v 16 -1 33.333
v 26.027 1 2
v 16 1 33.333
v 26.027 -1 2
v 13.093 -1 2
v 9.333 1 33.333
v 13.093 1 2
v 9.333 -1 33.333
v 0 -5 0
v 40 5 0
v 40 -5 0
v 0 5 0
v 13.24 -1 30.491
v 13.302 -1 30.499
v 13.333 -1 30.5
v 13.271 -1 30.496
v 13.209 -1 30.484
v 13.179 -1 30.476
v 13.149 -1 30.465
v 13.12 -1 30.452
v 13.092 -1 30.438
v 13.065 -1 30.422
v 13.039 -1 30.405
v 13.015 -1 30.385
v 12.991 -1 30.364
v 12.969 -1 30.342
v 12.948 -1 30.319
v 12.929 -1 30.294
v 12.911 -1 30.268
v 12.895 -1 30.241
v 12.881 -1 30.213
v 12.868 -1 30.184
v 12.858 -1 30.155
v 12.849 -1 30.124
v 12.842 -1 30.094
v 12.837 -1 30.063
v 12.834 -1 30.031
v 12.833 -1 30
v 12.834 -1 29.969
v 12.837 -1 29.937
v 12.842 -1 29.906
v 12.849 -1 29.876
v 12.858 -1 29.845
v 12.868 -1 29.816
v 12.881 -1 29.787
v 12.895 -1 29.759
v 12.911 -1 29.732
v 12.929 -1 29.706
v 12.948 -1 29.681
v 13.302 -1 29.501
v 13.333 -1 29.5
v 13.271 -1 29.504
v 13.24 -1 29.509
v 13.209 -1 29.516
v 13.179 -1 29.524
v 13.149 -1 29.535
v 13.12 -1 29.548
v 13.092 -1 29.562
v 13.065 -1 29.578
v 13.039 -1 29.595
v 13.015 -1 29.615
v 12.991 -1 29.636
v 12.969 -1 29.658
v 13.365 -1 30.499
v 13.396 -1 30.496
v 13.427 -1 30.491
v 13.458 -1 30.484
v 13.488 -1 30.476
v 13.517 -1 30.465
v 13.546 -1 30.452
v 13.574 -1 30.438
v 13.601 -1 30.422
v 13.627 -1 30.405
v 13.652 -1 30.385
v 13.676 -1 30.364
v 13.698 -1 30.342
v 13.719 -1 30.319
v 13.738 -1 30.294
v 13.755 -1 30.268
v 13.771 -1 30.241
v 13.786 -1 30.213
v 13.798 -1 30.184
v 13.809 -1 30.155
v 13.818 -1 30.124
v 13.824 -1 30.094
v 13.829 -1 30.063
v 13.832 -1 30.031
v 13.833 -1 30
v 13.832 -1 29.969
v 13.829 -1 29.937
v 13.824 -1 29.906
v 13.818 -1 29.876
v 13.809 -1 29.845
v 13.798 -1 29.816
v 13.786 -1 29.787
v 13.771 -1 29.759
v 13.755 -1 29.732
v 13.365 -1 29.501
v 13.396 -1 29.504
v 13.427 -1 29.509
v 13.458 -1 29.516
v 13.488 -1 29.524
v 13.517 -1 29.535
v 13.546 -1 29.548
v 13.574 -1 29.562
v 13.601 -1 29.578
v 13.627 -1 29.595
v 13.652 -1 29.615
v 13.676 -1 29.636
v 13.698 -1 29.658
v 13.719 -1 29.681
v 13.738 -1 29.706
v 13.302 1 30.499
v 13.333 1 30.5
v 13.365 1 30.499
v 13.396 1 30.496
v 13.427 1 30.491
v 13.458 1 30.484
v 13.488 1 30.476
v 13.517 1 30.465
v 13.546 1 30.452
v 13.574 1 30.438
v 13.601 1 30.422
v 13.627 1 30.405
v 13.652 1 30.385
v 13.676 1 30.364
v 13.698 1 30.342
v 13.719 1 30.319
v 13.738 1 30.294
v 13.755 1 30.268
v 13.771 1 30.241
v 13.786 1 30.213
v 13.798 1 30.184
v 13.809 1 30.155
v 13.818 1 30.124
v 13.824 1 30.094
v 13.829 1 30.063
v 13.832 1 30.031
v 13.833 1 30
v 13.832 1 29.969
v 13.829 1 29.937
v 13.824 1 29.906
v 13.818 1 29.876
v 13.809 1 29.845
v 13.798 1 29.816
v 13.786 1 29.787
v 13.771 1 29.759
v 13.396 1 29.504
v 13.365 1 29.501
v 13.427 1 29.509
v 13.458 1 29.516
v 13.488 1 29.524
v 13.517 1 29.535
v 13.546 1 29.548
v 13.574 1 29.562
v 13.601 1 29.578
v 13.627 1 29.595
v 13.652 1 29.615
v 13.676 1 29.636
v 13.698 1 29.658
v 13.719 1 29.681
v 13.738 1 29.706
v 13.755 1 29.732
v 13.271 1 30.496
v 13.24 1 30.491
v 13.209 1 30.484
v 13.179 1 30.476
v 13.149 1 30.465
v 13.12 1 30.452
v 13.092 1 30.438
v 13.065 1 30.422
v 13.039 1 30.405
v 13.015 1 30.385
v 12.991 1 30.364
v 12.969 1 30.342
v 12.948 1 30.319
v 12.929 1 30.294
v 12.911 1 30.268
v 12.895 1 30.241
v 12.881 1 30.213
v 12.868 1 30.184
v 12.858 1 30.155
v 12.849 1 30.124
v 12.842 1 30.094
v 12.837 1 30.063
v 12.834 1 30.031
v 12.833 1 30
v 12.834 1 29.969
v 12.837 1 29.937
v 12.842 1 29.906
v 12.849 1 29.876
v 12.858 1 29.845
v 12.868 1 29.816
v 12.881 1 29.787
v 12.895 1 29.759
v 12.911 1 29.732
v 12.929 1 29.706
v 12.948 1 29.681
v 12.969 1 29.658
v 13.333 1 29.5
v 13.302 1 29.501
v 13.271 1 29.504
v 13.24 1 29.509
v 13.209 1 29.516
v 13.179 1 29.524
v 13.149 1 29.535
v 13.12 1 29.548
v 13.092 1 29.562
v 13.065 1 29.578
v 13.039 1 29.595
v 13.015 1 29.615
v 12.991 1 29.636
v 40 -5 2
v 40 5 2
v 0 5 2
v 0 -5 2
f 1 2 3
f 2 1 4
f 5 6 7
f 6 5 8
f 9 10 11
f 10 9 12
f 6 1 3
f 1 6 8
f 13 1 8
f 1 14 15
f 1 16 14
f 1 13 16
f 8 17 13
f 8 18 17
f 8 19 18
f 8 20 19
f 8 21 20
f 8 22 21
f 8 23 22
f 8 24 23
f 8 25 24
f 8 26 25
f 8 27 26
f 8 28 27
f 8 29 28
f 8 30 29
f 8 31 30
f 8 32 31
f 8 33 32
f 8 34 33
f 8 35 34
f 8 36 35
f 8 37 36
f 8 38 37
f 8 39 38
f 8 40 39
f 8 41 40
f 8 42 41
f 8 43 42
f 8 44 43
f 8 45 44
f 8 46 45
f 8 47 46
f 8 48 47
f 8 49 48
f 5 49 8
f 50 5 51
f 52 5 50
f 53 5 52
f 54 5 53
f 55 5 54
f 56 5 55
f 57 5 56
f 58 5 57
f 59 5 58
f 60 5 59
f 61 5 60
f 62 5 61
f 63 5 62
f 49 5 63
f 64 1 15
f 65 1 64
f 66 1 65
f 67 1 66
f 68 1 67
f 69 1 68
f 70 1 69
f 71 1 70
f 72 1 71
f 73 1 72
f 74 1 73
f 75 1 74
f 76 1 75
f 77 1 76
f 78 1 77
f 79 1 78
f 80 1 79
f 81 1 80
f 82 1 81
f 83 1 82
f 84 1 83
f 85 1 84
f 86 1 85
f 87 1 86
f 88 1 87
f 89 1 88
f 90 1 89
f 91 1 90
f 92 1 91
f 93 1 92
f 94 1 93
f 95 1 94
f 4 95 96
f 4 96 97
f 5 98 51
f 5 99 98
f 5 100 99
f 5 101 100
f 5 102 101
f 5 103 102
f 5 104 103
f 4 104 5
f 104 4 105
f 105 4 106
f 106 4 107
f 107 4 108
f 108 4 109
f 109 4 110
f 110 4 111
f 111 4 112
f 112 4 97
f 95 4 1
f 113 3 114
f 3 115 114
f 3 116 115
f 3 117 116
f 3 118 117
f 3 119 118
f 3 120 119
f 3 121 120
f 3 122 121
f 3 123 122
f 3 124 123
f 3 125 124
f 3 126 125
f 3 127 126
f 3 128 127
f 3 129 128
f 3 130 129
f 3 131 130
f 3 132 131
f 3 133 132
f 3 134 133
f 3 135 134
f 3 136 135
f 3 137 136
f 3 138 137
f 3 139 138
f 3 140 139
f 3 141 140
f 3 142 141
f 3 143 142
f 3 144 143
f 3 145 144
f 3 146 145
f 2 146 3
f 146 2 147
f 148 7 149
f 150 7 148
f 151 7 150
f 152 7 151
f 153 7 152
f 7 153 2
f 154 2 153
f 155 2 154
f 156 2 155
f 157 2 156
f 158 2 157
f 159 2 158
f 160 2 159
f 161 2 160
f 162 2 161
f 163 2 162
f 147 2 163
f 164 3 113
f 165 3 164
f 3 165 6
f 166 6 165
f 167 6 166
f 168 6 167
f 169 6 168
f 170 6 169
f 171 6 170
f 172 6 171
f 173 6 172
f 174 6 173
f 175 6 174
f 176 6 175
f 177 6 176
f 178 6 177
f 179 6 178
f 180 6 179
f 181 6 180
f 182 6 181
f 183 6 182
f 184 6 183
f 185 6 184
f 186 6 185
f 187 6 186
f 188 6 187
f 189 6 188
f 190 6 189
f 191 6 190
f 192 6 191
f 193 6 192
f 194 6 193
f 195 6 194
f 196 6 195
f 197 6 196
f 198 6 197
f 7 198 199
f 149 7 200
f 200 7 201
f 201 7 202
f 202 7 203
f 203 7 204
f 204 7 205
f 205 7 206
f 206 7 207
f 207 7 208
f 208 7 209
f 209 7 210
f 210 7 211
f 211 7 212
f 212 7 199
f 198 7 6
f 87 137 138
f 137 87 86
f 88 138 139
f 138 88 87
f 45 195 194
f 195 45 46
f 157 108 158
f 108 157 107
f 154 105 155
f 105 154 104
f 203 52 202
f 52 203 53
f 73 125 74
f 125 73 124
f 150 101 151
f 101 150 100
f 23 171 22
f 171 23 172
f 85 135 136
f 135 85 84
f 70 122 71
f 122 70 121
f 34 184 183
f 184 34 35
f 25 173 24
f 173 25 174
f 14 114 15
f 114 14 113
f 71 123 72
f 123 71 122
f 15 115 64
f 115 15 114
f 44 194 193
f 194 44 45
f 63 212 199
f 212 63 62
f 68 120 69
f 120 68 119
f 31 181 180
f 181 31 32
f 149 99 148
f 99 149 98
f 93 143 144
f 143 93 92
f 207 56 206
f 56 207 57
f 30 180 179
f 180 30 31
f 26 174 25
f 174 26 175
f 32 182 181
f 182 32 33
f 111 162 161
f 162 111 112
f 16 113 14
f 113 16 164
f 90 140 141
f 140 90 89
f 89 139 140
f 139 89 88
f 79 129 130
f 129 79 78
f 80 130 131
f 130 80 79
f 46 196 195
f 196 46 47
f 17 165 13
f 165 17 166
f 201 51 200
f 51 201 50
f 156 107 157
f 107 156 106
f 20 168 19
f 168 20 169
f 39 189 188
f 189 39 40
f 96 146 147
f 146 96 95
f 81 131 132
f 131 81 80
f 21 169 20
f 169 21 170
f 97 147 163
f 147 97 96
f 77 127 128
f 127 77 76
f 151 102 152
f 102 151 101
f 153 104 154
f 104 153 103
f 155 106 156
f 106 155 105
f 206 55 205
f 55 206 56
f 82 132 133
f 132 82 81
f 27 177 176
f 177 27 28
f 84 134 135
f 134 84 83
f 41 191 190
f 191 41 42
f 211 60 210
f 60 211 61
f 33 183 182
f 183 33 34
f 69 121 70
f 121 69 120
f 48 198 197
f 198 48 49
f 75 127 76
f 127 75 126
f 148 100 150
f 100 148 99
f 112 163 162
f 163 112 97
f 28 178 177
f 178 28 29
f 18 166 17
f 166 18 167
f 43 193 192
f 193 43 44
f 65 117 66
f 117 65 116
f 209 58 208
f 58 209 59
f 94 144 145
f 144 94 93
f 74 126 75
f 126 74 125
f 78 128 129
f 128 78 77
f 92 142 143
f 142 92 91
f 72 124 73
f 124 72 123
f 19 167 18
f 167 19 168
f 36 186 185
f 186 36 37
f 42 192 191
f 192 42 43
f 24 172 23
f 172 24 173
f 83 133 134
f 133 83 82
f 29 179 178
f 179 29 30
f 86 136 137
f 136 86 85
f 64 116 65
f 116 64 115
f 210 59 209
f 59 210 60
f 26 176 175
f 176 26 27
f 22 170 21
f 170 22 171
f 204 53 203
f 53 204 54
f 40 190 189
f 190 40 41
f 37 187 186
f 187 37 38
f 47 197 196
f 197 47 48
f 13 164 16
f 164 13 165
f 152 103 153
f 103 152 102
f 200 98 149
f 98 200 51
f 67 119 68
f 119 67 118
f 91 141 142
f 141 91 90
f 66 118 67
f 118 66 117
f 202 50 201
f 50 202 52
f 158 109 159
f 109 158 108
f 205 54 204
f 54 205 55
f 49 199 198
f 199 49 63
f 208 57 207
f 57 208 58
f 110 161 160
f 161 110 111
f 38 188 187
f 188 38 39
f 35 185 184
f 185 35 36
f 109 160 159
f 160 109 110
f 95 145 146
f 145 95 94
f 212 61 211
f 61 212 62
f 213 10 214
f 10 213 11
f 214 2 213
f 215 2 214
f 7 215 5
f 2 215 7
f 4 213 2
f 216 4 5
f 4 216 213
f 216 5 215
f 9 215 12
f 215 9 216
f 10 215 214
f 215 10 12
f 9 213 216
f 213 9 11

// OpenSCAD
$fs = 0.1;
$fn = 100;
eps = $fs/2;

height = 30;

width = 10;
length = 40;
thickness = 2;
hole_diam = 1;


h = height;
a = length/3;
b = a/4;
s = b/5;

translate([0,-width/2,0])
cube([length, width, thickness]);

translate([0,thickness/2,0])
rotate([90,0,0])
    difference(){
        linear_extrude(height = thickness)
        polygon([[a,0],[2*a,0],[a-s+b,h+b],[a-s-b,h+b]]);

        translate([a,h,-eps])
        cylinder(2*thickness,hole_diam/2,hole_diam/2);
    }
